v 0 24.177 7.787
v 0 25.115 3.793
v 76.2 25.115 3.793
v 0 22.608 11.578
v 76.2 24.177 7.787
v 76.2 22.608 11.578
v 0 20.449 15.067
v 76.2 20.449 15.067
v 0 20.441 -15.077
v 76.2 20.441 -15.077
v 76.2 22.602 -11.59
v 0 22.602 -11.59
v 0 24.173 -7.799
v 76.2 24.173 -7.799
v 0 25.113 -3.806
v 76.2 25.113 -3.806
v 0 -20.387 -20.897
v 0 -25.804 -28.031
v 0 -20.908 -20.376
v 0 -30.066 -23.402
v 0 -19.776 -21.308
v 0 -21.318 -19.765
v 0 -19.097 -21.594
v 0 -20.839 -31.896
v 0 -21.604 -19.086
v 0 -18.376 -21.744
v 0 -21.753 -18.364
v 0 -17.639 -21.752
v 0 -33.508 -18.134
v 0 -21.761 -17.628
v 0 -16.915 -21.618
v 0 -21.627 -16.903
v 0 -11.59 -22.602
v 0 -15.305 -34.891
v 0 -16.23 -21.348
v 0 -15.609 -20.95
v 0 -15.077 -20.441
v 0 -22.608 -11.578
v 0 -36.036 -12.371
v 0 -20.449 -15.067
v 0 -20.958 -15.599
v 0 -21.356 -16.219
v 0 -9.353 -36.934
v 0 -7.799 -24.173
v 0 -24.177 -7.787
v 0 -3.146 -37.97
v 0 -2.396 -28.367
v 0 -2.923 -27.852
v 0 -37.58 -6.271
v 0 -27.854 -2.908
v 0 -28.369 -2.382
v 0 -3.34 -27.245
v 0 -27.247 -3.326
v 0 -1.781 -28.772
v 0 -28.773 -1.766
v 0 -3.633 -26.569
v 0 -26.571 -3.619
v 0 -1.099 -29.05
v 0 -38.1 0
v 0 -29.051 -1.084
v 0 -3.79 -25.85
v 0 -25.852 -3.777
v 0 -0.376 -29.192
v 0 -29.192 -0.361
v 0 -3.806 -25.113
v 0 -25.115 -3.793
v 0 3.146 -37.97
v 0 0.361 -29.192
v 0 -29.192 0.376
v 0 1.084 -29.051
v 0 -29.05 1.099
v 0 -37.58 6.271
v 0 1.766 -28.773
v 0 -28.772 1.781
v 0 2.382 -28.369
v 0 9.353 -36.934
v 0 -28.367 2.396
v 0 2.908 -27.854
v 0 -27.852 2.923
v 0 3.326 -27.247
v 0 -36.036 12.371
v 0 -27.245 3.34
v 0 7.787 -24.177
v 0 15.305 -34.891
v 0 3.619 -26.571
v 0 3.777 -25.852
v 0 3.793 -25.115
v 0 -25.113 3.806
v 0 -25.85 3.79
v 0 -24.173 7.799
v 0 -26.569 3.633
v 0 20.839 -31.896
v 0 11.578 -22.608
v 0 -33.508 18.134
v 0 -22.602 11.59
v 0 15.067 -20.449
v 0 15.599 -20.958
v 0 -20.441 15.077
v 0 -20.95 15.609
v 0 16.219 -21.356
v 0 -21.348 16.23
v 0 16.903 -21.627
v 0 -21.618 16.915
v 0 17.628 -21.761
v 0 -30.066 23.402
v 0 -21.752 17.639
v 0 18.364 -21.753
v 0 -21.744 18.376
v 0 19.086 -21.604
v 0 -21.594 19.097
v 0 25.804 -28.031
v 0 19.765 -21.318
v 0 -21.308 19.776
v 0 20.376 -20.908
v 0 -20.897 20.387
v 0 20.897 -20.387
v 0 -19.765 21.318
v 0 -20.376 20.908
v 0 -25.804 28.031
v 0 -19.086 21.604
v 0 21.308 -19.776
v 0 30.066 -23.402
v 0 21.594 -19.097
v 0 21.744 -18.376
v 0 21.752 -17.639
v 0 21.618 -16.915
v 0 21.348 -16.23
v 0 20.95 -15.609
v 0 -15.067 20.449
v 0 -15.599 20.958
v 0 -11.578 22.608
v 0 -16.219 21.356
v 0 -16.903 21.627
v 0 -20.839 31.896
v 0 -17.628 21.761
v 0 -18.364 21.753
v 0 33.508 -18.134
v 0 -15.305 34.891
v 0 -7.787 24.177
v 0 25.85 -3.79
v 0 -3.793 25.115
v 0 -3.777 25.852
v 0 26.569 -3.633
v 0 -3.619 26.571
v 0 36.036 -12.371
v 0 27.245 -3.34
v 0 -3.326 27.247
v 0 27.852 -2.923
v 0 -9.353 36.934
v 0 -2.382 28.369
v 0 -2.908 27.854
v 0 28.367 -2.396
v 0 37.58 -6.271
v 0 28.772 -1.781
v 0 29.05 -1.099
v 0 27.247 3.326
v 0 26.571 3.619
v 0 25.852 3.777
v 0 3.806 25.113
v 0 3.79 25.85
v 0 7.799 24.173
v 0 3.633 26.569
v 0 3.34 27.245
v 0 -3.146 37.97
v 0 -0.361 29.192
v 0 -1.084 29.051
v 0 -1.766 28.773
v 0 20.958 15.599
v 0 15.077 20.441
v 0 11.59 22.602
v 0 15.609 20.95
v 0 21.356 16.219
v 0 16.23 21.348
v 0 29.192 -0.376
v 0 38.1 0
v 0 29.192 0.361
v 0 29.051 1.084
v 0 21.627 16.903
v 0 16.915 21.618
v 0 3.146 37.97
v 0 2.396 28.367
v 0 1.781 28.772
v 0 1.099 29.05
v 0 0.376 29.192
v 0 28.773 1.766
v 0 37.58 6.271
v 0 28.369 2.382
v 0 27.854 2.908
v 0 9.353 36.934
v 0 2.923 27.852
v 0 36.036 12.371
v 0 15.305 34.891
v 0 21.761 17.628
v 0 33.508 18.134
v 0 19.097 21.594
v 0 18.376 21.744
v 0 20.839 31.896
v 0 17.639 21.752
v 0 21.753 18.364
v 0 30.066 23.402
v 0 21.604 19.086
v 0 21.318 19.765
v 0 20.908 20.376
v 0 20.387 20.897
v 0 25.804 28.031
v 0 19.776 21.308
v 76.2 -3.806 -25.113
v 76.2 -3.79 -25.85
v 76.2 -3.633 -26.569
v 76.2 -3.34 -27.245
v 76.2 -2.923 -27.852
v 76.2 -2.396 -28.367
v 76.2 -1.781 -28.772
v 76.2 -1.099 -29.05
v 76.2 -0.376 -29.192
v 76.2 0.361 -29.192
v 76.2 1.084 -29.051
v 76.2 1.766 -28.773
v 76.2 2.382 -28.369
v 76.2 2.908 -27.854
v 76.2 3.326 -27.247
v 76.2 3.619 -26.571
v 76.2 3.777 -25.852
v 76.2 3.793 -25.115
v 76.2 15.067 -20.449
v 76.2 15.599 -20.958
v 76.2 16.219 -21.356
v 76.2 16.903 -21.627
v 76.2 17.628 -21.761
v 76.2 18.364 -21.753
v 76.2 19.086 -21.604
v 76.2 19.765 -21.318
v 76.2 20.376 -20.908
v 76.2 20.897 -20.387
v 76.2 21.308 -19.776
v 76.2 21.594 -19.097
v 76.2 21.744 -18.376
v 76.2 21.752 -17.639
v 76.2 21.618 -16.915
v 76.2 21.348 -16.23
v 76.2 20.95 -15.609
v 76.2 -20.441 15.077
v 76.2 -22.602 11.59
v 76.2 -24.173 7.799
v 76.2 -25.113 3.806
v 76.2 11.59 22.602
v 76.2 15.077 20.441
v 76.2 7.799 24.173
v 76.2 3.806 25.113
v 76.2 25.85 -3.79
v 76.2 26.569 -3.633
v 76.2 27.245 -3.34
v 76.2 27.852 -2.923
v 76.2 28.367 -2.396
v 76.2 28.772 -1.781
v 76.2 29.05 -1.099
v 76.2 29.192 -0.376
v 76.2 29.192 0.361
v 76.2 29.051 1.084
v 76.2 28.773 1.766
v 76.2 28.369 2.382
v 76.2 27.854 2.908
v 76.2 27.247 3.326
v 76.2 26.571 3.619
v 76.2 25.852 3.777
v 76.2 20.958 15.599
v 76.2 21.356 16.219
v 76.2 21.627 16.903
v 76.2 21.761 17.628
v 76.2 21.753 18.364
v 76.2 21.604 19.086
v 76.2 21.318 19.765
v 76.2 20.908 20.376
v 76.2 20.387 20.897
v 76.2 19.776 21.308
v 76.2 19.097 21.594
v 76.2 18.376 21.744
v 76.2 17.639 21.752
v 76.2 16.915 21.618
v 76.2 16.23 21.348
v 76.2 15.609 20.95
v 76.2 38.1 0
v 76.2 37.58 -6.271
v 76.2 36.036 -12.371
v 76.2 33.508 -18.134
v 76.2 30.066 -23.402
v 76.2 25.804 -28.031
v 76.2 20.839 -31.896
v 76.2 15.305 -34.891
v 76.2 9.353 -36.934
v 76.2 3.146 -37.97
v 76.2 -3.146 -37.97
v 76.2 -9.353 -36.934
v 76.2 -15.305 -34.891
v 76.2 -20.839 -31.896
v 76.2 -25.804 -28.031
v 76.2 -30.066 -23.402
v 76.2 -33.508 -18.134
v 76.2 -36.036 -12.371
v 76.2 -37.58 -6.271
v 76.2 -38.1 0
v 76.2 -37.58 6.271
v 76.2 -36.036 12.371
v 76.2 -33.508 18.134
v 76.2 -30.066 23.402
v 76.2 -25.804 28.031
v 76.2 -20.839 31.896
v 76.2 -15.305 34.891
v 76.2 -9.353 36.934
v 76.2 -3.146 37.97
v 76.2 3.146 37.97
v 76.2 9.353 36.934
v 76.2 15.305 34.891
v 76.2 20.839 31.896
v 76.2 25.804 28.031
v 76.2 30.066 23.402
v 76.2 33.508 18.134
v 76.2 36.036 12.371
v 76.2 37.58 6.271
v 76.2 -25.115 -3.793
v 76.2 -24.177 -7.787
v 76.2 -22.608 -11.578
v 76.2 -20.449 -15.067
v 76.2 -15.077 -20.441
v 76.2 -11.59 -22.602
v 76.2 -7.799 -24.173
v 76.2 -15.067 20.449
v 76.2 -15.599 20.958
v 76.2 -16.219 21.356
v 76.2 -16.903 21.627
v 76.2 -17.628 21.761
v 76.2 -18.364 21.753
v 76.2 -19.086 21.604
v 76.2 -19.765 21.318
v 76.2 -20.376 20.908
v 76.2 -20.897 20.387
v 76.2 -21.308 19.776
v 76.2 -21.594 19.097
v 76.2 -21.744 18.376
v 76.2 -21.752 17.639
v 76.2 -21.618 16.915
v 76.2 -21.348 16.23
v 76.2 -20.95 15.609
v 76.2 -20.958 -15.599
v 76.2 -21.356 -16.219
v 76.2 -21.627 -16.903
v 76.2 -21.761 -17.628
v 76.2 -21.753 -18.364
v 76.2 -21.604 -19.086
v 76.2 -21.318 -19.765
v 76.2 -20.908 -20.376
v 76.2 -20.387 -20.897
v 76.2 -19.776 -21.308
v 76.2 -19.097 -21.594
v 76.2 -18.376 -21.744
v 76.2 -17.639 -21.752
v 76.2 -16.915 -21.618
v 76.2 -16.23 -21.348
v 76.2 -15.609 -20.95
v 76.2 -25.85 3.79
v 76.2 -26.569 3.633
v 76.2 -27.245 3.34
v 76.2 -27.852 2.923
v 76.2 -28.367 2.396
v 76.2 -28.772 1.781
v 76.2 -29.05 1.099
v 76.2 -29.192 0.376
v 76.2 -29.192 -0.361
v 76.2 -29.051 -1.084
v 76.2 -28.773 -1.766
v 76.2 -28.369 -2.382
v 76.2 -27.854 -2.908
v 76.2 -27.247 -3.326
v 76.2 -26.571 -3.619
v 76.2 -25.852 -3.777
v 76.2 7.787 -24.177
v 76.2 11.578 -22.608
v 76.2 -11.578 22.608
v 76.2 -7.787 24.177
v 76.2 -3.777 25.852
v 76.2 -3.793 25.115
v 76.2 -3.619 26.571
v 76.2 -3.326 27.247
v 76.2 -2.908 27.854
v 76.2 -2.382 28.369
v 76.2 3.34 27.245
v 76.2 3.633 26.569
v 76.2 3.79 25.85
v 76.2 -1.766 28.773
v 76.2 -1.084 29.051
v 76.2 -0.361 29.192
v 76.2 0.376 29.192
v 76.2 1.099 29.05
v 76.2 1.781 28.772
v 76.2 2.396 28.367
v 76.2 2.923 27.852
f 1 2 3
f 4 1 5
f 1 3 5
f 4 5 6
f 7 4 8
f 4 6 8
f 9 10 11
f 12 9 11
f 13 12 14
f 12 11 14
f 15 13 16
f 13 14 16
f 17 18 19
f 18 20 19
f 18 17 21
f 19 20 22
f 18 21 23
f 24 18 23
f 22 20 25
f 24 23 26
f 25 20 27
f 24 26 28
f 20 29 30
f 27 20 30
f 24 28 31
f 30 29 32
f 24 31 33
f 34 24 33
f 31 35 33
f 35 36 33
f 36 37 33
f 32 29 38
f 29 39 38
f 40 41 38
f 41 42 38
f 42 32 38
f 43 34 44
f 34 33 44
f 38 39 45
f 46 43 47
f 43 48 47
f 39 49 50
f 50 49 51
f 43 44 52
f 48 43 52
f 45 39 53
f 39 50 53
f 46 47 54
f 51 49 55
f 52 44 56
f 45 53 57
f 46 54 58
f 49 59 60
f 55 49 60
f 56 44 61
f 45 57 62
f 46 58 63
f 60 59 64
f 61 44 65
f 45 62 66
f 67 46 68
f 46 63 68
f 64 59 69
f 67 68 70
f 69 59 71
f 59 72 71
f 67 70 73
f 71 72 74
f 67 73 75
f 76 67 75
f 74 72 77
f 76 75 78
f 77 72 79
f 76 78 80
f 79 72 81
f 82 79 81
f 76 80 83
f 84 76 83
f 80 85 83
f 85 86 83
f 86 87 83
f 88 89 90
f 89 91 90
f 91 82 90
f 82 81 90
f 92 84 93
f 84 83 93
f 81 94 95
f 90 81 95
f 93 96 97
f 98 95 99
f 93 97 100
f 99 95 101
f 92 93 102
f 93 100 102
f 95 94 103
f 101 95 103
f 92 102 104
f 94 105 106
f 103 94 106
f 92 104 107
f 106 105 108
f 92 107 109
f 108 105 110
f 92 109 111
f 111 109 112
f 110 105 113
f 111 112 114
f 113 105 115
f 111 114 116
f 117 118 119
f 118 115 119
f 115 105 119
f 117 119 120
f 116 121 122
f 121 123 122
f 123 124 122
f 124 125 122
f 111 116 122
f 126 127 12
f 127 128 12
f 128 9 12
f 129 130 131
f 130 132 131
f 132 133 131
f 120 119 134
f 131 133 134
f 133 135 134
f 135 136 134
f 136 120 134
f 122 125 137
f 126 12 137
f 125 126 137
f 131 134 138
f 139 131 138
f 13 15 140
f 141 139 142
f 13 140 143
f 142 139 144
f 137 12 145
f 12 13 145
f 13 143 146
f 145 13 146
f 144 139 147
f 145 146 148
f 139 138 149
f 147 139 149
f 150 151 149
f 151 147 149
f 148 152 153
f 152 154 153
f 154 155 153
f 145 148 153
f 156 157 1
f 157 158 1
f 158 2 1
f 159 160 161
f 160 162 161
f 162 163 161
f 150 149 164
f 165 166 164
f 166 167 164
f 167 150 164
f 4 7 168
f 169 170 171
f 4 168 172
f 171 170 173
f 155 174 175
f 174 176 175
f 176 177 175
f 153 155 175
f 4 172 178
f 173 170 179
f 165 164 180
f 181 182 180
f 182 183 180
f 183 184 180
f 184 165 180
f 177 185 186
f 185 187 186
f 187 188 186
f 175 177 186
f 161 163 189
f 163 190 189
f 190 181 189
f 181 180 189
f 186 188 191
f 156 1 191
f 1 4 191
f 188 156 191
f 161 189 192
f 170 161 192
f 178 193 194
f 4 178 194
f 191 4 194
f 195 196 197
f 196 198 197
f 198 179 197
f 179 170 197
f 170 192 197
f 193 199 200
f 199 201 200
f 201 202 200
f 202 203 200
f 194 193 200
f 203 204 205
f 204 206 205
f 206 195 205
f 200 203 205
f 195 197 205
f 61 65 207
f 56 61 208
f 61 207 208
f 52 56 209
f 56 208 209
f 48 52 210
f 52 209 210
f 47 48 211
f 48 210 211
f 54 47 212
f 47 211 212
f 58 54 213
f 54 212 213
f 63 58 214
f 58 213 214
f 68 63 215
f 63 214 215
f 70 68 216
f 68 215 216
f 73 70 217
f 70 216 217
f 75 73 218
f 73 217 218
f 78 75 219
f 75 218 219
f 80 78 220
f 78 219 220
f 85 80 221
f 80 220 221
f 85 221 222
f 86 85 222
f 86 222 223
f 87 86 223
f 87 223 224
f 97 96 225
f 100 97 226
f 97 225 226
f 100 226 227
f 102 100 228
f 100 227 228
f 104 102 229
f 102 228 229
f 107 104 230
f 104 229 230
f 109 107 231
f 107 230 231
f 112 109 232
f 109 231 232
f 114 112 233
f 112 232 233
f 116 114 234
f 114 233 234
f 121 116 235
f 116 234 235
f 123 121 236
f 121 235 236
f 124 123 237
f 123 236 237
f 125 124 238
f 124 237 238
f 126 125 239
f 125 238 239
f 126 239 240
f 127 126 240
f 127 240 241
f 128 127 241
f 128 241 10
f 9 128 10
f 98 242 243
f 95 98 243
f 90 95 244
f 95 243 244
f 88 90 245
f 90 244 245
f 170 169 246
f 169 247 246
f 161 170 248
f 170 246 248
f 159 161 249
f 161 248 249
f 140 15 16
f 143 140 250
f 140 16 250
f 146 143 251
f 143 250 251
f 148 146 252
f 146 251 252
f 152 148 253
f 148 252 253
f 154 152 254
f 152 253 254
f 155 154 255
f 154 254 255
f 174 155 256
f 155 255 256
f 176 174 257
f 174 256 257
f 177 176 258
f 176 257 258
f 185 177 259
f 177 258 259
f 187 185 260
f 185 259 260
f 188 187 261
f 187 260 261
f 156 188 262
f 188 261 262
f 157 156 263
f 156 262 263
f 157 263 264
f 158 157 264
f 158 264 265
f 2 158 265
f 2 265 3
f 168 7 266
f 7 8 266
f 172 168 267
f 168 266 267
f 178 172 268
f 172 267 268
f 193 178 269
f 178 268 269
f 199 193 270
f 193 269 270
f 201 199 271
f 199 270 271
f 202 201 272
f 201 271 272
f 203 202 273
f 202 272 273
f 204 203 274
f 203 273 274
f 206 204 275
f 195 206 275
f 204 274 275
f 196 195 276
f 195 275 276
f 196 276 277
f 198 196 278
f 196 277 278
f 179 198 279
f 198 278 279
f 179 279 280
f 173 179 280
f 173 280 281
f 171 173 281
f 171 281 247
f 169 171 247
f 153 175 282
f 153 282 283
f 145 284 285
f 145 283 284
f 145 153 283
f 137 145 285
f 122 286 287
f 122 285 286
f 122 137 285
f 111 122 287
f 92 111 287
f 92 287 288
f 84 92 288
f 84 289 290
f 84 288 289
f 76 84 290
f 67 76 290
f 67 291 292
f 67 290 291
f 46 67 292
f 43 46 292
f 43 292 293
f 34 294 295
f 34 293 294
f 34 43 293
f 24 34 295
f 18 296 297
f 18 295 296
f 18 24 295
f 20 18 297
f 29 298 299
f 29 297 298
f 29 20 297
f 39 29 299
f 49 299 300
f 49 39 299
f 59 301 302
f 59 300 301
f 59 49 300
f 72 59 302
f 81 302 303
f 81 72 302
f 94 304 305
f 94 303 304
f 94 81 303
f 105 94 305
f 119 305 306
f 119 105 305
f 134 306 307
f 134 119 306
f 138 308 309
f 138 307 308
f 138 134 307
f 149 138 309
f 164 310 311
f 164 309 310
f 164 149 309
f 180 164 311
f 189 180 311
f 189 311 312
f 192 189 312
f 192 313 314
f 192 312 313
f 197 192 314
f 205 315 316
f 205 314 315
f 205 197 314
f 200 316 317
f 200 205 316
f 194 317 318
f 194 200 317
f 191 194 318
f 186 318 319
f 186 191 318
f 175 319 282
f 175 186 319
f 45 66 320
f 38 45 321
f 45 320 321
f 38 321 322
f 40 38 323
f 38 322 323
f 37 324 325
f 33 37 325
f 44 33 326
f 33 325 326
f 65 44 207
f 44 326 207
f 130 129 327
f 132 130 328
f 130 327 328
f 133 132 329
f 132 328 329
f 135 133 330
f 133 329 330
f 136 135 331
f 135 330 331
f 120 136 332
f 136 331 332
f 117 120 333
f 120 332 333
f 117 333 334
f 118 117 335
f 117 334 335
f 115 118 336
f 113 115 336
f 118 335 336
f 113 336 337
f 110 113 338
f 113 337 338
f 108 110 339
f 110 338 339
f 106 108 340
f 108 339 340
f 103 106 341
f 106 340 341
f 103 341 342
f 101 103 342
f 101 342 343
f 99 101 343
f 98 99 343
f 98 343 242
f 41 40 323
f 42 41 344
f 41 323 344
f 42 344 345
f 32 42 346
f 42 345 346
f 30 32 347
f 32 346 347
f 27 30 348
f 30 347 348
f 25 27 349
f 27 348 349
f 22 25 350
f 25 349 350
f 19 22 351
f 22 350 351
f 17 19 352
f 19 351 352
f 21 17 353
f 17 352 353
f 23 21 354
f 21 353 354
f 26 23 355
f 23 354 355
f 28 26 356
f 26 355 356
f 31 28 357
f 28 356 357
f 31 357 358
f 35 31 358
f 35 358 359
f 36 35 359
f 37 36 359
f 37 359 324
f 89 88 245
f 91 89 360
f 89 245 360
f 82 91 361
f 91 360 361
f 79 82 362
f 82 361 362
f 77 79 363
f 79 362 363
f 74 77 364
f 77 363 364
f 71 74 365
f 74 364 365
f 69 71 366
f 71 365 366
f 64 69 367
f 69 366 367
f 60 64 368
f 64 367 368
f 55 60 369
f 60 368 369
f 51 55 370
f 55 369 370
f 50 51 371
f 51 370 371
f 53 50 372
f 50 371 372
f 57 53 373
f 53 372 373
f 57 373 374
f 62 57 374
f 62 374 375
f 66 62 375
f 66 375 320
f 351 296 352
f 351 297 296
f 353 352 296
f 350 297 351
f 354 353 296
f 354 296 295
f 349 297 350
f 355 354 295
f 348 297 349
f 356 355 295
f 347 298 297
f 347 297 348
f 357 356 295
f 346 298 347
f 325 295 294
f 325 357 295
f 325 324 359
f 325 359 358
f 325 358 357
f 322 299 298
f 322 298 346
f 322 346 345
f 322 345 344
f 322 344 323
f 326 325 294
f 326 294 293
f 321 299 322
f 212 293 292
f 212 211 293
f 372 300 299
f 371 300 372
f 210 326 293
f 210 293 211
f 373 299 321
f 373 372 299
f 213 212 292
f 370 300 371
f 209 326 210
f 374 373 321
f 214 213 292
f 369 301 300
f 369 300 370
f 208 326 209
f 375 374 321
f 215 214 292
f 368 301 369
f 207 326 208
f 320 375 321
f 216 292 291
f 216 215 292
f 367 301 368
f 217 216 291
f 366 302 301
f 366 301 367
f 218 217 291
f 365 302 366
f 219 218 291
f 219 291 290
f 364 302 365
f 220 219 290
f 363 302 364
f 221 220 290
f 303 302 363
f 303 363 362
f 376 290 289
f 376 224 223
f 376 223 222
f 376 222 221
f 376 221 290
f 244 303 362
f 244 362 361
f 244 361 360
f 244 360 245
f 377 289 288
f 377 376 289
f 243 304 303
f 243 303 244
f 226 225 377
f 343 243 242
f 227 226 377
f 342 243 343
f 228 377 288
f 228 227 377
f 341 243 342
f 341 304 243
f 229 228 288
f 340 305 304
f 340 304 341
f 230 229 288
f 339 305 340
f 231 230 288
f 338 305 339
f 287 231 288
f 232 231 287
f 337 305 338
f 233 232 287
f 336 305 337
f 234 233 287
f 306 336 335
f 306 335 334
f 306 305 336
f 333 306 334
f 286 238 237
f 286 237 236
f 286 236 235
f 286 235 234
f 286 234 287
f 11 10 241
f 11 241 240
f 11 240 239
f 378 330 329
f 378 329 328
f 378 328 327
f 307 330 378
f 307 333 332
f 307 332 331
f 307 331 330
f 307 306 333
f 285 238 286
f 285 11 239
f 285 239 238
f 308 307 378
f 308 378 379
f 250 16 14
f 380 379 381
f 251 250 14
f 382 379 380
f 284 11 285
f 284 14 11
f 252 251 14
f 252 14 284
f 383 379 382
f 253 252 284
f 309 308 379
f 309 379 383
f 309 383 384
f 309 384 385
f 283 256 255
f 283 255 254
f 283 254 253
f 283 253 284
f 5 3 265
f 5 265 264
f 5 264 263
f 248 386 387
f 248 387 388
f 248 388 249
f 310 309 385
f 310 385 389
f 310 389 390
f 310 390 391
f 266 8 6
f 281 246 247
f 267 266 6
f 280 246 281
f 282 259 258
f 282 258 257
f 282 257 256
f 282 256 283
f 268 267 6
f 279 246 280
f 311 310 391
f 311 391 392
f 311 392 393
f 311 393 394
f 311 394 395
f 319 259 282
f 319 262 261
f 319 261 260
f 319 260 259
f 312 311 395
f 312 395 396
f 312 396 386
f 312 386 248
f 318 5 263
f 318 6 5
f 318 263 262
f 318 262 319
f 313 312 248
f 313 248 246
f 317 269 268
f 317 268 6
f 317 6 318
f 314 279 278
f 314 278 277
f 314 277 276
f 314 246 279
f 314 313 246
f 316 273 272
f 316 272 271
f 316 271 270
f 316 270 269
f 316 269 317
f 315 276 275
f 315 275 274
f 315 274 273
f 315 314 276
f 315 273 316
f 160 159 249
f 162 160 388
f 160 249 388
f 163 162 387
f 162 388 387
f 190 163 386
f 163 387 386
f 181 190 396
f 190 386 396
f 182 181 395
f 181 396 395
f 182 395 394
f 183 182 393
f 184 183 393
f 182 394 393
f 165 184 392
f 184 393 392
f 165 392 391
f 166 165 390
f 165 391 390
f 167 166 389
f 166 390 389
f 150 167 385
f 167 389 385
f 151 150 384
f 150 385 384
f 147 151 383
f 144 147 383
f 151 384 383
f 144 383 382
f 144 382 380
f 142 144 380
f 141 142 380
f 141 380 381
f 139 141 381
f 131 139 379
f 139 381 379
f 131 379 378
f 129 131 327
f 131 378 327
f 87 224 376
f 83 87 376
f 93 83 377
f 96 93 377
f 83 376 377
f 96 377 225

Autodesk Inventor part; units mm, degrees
ref_plane "YZ Plane" through (0, 0, 0) normal (1, 0, 0) x (0, 1, 0)
ref_plane "XZ Plane" through (0, 0, 0) normal (0, 1, 0) x (-1, 0, 0)
ref_plane "XY Plane" through (0, 0, 0) normal (0, 0, 1) x (1, 0, 0)
sketch "Sketch1" plane through (0, 0, 0) normal (1, 0, 0) x (0, 1, 0)
  circle A0 centre (0, 0) radius 38.1
  dimension "d0" = 76.2
extrude "Extrusion1" add sketch "Sketch1" along normal blind 76.2
sketch "Sketch2" plane through (76.2, 0, 0) normal (1, 0, 0) x (0, 0, -1)
  circle A0 centre (0, 0) radius 25.4
  dimension "d3" = 50.8
extrude "Extrusion2" cut sketch "Sketch2" against normal blind 152.4
sketch "Sketch3" plane through (76.2, 0, 0) normal (1, 0, 0) x (0, 0, -1)
  circle A0 centre (0, 0) radius 25.4
  circle A1 centre (0, 0) radius 25.4 projected
  circle A2 centre (0.0066, 25.4) radius 3.81
  circle A3 centre (-17.9558, 17.9652) radius 3.81
  circle A4 centre (-25.4, 0.0066) radius 3.81
  circle A5 centre (-17.9652, -17.9558) radius 3.81
  circle A6 centre (-0.0066, -25.4) radius 3.81
  circle A7 centre (17.9558, -17.9652) radius 3.81
  circle A8 centre (25.4, -0.0066) radius 3.81
  circle A9 centre (17.9652, 17.9558) radius 3.81
  dimension "d6" = 7.62
  dimension "d9" = 360
extrude "Extrusion3" cut sketch "Sketch3" against normal blind 152.4 contours A0 A8 | A0 A8 | A9 A0 | A0 A9 | A7 A0 | A0 A7 | A2 A0 | A0 A2 | A6 A0 | A0 A6 | A3 A0 | A0 A3 | A5 A0 | A0 A5 | A4 A0 | A0 A4
